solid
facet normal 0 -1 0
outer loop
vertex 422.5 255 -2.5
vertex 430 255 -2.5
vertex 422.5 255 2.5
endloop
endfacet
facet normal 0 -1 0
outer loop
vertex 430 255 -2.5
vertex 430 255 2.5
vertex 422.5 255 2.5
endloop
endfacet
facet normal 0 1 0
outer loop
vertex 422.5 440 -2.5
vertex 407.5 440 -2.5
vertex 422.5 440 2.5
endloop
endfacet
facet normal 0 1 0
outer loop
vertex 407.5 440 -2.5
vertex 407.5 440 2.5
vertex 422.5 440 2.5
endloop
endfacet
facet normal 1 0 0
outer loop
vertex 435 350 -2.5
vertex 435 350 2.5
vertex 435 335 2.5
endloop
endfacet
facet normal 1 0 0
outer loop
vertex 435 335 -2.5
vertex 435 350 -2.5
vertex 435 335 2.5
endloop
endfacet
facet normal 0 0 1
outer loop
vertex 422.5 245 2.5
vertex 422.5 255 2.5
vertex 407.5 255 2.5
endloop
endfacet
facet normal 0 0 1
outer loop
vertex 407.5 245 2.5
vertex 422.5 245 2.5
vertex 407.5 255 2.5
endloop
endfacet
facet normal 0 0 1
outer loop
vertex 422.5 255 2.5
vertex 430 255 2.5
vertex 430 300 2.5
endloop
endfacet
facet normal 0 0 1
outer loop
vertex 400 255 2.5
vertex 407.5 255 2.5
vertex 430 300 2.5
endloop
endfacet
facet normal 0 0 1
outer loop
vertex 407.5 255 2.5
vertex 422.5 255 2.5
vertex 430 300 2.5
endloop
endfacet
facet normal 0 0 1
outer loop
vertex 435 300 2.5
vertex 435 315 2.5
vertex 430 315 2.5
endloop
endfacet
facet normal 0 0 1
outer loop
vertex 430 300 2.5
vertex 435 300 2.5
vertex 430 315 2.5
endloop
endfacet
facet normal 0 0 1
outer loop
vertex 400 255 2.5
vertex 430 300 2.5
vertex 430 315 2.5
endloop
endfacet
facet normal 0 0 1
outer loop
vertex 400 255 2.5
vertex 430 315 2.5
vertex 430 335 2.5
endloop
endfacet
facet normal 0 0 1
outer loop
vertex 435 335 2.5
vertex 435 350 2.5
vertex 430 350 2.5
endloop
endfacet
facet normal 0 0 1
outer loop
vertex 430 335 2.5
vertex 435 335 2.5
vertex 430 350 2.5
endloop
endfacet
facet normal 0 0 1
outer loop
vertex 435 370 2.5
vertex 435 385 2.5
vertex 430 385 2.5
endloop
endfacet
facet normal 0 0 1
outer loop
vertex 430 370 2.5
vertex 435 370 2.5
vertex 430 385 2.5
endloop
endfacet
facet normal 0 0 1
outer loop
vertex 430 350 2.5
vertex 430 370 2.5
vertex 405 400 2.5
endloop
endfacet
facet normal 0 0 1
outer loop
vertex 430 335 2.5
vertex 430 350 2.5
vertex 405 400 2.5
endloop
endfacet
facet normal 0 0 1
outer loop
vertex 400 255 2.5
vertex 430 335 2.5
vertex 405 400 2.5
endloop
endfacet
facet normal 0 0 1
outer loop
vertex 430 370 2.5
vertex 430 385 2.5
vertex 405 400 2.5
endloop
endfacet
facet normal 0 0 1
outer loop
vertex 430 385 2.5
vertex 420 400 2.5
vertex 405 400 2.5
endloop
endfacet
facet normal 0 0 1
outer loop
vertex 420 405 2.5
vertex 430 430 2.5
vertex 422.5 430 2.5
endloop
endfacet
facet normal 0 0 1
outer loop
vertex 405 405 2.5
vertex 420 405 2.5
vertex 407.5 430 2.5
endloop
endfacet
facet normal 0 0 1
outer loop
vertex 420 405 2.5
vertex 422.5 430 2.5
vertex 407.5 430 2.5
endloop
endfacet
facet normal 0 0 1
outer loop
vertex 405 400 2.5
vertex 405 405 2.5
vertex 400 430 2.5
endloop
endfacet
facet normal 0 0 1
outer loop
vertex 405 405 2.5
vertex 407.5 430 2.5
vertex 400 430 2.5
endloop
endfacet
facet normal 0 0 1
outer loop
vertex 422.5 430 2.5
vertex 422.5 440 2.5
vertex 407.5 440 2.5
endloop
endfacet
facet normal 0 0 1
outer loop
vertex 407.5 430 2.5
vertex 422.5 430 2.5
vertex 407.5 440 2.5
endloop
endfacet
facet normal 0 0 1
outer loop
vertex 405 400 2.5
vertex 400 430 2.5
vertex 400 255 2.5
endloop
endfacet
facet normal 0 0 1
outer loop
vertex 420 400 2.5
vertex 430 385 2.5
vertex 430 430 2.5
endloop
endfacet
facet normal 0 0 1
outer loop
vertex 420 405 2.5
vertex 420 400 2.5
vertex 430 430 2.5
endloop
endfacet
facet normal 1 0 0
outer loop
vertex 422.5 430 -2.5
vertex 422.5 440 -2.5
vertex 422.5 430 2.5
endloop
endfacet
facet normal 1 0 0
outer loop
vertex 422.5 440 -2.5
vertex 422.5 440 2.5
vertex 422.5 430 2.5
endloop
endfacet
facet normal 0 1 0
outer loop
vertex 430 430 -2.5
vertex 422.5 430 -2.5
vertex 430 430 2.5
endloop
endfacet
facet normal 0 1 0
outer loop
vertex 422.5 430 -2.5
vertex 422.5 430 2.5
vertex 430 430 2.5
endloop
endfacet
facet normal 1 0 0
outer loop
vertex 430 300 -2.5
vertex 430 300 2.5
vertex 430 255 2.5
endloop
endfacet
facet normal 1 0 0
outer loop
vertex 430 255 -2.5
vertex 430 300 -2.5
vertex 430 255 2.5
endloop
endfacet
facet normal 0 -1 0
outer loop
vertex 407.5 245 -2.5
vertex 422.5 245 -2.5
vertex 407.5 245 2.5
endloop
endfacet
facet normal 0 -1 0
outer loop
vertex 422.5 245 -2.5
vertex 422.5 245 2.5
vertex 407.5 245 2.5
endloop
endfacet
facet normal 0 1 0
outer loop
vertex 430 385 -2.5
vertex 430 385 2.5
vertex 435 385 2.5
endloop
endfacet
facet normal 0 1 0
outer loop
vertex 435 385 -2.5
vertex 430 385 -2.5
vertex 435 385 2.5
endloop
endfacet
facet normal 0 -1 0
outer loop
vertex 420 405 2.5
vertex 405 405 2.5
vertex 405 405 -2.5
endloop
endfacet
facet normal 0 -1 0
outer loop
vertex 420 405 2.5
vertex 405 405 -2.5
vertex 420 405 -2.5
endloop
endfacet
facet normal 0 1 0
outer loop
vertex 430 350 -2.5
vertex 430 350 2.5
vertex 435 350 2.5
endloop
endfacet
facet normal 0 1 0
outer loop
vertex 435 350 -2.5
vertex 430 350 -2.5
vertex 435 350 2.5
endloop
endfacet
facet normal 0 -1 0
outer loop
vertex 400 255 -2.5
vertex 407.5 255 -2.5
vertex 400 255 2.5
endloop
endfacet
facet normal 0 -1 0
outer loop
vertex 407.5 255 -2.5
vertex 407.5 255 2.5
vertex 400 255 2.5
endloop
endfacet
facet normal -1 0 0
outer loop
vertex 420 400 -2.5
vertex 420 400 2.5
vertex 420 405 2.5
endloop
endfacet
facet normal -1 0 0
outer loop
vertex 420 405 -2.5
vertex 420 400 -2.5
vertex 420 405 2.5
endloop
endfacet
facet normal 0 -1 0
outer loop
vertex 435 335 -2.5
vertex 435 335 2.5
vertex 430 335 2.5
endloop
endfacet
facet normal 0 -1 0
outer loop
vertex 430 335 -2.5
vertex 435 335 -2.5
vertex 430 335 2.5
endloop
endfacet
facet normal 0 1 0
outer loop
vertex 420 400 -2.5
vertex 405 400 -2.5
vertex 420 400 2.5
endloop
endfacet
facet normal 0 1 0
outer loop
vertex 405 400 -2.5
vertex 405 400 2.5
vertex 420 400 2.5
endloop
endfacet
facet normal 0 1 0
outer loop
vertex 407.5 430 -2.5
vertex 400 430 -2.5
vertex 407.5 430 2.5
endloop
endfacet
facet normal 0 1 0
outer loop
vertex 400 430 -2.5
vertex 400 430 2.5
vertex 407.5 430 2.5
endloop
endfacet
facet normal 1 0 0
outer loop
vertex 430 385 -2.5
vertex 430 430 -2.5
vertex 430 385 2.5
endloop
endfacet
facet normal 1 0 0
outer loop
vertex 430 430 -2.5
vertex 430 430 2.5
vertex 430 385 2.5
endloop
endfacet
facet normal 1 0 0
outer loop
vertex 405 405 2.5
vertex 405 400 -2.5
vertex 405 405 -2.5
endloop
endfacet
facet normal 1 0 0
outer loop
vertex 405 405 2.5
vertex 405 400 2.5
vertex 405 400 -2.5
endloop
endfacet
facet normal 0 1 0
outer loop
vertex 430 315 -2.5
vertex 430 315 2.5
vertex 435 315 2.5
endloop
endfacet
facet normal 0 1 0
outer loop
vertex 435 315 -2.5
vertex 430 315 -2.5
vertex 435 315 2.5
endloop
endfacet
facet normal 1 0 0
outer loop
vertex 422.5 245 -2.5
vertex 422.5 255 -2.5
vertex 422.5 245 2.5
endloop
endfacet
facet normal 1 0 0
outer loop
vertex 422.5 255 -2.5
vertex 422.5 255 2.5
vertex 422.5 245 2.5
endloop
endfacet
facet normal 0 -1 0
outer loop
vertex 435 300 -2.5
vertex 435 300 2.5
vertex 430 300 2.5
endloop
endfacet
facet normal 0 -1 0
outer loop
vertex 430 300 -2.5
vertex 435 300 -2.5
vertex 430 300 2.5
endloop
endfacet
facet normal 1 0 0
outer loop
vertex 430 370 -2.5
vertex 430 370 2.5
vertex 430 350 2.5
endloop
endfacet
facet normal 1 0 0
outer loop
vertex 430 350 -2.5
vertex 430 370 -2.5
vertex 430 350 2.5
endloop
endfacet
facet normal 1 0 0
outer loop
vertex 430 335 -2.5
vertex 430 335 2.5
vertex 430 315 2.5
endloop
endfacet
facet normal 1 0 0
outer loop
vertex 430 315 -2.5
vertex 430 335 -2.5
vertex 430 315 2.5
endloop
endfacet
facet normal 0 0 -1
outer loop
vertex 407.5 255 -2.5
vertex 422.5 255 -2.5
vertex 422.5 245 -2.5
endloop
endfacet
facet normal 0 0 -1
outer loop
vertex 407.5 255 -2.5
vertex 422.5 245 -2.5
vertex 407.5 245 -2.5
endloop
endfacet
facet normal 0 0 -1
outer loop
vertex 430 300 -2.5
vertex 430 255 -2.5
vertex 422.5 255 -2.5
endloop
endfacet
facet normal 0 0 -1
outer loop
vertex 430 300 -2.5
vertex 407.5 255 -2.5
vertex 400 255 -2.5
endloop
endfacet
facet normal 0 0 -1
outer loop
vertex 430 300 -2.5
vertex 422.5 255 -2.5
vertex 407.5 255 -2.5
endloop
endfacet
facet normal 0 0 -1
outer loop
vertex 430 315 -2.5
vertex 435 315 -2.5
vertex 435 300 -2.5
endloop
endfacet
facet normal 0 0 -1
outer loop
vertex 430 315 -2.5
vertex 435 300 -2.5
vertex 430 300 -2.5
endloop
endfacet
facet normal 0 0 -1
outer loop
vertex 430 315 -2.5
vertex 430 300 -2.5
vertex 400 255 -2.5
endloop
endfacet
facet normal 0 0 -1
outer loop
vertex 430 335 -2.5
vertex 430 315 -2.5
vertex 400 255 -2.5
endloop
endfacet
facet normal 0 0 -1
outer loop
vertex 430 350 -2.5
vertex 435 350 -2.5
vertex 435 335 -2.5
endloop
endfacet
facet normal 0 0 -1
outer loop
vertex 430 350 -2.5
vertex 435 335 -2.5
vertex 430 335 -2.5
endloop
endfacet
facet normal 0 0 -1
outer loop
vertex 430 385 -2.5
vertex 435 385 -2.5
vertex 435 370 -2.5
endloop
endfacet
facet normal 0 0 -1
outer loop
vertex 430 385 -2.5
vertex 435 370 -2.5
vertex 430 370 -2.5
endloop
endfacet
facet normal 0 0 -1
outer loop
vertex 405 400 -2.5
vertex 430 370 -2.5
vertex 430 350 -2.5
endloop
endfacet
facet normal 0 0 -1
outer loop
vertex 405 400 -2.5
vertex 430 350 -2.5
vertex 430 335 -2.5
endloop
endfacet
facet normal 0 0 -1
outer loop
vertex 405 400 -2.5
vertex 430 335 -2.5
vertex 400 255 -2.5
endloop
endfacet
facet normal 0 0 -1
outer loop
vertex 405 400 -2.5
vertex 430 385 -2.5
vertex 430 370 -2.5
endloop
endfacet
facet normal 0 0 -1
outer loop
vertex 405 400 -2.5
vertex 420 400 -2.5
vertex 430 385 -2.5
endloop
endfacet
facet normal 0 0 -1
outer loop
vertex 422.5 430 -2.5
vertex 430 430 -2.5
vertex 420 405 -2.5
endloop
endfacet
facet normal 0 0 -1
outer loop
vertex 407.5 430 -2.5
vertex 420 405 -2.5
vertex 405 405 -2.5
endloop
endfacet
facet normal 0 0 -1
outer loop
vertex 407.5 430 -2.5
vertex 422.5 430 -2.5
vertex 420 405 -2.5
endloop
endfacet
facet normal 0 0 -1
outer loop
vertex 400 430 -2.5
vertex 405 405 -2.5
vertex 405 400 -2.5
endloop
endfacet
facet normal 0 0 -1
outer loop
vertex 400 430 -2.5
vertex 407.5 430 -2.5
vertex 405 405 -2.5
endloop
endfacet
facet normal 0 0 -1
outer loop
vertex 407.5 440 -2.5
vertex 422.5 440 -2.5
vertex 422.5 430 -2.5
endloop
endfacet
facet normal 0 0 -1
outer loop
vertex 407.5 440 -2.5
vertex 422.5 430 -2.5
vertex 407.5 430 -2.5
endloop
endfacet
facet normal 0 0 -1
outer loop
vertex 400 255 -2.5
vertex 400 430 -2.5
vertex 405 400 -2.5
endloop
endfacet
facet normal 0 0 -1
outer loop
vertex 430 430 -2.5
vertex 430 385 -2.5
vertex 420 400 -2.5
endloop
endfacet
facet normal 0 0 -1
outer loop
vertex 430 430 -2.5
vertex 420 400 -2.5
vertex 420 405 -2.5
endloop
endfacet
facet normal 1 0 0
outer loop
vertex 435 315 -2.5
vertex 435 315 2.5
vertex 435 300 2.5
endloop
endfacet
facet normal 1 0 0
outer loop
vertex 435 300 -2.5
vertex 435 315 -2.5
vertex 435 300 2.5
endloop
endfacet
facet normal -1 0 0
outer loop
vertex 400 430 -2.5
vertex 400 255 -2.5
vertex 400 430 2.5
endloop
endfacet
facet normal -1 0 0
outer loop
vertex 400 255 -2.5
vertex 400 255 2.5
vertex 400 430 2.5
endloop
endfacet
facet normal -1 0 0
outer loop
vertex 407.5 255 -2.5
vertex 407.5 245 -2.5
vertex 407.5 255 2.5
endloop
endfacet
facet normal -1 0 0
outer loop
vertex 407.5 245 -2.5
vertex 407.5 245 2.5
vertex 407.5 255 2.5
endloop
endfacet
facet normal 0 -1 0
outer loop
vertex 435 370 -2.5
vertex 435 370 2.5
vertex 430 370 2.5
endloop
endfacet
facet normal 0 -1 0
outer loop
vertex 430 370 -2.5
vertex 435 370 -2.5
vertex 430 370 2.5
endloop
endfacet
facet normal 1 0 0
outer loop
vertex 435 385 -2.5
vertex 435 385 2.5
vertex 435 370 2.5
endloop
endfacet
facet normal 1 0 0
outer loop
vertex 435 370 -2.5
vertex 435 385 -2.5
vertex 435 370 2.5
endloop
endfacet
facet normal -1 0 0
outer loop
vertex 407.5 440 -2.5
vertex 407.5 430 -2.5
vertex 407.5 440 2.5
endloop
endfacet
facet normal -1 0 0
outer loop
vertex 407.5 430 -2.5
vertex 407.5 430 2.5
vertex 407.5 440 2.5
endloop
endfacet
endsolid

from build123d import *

# Parameters (mm, degrees)
SKETCH1_W           = 15
SKETCH1_H           = 5
BOSS_EXTRUDE1_DEPTH = 2.5


with BuildPart() as part:
    # Sketch1 → Boss-Extrude1 (new, symmetric)
    with BuildSketch(Plane.XY):
        Polygon((430, 300), (430, 255), (422.5, 255), (422.5, 245), (407.5, 245), (407.5, 255), (400, 255), (400, 430), (407.5, 430), (407.5, 440), (422.5, 440), (422.5, 430), (430, 430), (430, 385), (435, 385), (435, 370), (430, 370), (430, 350), (435, 350), (435, 335), (430, 335), (430, 315), (435, 315), (435, 300), align=None)
        with Locations((412.5, 402.5)):
            Rectangle(SKETCH1_W, SKETCH1_H, mode=Mode.SUBTRACT)
    extrude(amount=BOSS_EXTRUDE1_DEPTH, both=True)


solid = part.part
